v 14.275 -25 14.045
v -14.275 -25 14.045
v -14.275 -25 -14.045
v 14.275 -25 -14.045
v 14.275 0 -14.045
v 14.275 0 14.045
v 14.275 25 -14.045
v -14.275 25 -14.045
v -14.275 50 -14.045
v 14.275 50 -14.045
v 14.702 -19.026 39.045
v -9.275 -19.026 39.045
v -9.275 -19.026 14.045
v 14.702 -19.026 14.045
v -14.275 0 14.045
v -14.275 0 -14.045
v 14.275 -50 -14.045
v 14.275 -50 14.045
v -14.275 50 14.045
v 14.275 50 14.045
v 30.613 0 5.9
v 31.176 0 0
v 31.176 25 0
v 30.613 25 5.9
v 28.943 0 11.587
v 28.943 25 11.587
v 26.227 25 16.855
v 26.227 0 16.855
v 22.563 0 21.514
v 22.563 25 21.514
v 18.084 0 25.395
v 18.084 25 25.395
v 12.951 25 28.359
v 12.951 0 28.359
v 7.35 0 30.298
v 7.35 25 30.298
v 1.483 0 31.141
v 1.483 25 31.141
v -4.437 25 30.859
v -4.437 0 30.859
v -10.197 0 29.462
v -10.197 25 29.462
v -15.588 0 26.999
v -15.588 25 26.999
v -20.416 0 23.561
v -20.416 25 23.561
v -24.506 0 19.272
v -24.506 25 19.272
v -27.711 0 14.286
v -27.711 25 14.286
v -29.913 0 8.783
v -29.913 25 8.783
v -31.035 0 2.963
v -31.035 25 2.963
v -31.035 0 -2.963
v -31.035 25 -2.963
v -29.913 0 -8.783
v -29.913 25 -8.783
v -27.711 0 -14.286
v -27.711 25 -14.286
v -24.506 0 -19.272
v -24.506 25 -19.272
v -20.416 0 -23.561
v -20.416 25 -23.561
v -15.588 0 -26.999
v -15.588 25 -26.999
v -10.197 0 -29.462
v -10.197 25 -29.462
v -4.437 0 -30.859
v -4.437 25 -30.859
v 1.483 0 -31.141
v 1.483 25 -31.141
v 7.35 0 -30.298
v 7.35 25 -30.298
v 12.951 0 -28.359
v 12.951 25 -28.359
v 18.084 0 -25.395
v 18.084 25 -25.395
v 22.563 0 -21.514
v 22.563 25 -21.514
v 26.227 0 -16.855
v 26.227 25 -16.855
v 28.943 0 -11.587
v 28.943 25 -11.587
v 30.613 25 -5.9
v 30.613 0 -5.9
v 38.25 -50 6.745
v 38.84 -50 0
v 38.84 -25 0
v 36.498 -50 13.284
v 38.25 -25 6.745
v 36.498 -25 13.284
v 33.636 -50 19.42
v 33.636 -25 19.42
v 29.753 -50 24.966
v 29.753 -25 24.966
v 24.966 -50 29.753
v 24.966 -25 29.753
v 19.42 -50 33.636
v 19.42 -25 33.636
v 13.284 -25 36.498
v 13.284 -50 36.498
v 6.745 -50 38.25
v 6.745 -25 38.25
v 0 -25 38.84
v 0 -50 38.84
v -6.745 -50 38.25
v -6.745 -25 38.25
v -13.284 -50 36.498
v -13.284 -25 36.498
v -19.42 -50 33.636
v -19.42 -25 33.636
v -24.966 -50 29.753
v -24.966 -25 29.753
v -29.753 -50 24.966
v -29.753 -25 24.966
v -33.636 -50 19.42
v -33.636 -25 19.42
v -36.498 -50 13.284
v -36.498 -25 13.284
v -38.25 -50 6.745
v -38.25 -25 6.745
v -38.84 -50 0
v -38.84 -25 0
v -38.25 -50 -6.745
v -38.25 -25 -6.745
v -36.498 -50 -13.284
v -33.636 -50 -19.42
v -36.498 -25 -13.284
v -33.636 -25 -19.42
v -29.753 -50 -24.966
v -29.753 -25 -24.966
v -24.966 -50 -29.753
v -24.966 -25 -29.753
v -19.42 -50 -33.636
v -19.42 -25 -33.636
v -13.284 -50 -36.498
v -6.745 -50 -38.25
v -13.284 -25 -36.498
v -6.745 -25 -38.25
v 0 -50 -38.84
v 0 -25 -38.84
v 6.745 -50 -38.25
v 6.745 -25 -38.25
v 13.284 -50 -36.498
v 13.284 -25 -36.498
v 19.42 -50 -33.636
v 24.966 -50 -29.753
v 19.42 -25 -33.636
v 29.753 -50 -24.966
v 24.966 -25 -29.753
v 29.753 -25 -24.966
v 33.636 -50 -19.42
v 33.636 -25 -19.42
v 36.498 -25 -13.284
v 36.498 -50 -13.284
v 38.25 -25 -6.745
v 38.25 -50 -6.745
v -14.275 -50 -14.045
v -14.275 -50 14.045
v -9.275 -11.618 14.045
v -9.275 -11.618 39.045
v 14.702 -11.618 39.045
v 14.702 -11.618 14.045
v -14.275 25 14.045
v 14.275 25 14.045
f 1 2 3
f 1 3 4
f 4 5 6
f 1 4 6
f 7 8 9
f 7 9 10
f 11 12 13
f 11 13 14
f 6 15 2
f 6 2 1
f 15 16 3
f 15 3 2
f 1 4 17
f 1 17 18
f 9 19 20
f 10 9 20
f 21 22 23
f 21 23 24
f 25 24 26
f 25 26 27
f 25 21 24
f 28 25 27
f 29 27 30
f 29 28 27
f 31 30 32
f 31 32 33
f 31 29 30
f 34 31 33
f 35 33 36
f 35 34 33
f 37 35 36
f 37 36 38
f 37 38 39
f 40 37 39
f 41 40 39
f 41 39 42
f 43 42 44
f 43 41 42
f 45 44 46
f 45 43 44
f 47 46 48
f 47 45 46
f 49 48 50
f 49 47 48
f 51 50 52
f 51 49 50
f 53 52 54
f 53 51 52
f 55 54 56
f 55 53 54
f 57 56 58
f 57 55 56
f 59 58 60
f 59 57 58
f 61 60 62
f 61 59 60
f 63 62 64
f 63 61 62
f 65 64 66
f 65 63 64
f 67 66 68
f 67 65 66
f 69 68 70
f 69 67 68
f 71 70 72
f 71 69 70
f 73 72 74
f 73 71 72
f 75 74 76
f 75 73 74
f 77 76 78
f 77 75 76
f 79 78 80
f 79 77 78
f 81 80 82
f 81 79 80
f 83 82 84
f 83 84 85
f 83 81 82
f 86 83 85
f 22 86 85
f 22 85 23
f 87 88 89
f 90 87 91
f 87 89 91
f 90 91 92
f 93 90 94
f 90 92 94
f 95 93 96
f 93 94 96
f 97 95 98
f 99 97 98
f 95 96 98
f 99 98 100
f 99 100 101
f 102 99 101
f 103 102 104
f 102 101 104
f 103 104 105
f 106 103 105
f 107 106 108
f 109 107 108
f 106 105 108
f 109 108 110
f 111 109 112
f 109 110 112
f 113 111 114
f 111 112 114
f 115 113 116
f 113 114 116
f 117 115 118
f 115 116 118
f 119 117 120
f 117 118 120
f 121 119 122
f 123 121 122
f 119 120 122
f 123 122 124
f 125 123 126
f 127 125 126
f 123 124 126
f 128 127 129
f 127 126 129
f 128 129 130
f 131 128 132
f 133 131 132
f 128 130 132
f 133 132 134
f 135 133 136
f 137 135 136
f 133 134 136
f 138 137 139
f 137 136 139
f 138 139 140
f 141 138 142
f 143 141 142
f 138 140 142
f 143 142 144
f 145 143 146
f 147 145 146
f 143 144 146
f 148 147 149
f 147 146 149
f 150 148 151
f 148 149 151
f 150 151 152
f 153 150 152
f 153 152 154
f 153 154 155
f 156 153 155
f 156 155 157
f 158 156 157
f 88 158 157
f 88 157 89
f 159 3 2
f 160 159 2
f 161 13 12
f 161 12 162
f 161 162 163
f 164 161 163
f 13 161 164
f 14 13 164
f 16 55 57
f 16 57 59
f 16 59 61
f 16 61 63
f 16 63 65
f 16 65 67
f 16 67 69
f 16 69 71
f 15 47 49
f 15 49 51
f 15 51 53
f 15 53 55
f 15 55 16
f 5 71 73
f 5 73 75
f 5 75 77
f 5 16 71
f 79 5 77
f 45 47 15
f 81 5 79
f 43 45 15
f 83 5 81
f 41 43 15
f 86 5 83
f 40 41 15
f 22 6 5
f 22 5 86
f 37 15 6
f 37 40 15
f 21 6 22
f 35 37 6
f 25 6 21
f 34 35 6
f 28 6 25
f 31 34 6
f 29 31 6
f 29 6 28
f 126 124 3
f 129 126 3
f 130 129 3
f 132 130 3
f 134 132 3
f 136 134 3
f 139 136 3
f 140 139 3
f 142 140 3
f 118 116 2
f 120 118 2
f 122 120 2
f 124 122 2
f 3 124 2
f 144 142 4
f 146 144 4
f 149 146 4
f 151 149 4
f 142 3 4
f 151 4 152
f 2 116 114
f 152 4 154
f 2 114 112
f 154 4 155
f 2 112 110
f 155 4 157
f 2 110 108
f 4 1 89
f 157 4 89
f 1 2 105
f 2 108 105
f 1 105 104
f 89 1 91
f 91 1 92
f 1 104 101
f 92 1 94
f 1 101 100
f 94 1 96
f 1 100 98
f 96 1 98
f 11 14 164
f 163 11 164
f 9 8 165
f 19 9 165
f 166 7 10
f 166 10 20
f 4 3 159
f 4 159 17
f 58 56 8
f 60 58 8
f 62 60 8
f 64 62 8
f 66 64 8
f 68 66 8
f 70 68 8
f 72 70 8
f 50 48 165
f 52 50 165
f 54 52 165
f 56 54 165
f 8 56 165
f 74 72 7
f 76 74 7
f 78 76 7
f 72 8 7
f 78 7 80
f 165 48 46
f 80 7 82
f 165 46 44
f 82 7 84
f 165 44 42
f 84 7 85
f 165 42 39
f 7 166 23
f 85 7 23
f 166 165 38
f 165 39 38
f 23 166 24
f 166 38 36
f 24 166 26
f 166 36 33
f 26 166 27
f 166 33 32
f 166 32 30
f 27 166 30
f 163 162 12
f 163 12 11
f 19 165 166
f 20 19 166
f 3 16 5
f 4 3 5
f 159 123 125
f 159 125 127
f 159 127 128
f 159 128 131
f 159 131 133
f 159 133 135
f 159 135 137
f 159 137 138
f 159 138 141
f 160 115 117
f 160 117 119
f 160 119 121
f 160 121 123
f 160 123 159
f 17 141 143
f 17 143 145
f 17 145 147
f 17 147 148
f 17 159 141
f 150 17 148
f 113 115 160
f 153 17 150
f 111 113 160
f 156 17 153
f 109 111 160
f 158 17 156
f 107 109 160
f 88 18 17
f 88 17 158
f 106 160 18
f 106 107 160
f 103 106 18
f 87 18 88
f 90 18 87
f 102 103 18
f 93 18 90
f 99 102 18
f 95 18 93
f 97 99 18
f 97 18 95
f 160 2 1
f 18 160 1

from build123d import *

# Parameters (mm, degrees)
F0_R          = 31.176317
F1_DEPTH      = 25
F2_W          = 28.550662
F2_H          = 28.090542
F3_DEPTH      = 25
F3_DEPTH_BACK = 50
F4_W          = 23.977553
F4_H          = 7.407701
F5_DEPTH      = 25
F6_R          = 38.840067
F6_W          = 28.550662
F6_H          = 28.090542
F7_DEPTH      = 25


with BuildPart() as f1:
    # F0 (on Front) → F1 (new body)
    with BuildSketch(Plane.XZ):
        Circle(F0_R)
    extrude(amount=-F1_DEPTH)

    # F2 (on face) → F3 (join, two sides)
    with BuildSketch(Plane.XZ) as f3_sk:
        Rectangle(F2_W, F2_H)
    extrude(amount=F3_DEPTH)
    extrude(f3_sk.sketch, amount=-F3_DEPTH_BACK)


with BuildPart() as f5:
    # F4 (on face) → F5 (new body)
    with BuildSketch(Plane.XY.offset(14.045271)):
        with Locations((2.713445, -15.321654)):
            Rectangle(F4_W, F4_H)
    extrude(amount=F5_DEPTH)


with BuildPart() as f7:
    # F6 (on face) → F7 (new body)
    with BuildSketch(Plane.XZ.offset(25)):
        Circle(F6_R)
        Rectangle(F6_W, F6_H, mode=Mode.SUBTRACT)
    extrude(amount=F7_DEPTH)


solid = Compound([f1.part, f5.part, f7.part])
